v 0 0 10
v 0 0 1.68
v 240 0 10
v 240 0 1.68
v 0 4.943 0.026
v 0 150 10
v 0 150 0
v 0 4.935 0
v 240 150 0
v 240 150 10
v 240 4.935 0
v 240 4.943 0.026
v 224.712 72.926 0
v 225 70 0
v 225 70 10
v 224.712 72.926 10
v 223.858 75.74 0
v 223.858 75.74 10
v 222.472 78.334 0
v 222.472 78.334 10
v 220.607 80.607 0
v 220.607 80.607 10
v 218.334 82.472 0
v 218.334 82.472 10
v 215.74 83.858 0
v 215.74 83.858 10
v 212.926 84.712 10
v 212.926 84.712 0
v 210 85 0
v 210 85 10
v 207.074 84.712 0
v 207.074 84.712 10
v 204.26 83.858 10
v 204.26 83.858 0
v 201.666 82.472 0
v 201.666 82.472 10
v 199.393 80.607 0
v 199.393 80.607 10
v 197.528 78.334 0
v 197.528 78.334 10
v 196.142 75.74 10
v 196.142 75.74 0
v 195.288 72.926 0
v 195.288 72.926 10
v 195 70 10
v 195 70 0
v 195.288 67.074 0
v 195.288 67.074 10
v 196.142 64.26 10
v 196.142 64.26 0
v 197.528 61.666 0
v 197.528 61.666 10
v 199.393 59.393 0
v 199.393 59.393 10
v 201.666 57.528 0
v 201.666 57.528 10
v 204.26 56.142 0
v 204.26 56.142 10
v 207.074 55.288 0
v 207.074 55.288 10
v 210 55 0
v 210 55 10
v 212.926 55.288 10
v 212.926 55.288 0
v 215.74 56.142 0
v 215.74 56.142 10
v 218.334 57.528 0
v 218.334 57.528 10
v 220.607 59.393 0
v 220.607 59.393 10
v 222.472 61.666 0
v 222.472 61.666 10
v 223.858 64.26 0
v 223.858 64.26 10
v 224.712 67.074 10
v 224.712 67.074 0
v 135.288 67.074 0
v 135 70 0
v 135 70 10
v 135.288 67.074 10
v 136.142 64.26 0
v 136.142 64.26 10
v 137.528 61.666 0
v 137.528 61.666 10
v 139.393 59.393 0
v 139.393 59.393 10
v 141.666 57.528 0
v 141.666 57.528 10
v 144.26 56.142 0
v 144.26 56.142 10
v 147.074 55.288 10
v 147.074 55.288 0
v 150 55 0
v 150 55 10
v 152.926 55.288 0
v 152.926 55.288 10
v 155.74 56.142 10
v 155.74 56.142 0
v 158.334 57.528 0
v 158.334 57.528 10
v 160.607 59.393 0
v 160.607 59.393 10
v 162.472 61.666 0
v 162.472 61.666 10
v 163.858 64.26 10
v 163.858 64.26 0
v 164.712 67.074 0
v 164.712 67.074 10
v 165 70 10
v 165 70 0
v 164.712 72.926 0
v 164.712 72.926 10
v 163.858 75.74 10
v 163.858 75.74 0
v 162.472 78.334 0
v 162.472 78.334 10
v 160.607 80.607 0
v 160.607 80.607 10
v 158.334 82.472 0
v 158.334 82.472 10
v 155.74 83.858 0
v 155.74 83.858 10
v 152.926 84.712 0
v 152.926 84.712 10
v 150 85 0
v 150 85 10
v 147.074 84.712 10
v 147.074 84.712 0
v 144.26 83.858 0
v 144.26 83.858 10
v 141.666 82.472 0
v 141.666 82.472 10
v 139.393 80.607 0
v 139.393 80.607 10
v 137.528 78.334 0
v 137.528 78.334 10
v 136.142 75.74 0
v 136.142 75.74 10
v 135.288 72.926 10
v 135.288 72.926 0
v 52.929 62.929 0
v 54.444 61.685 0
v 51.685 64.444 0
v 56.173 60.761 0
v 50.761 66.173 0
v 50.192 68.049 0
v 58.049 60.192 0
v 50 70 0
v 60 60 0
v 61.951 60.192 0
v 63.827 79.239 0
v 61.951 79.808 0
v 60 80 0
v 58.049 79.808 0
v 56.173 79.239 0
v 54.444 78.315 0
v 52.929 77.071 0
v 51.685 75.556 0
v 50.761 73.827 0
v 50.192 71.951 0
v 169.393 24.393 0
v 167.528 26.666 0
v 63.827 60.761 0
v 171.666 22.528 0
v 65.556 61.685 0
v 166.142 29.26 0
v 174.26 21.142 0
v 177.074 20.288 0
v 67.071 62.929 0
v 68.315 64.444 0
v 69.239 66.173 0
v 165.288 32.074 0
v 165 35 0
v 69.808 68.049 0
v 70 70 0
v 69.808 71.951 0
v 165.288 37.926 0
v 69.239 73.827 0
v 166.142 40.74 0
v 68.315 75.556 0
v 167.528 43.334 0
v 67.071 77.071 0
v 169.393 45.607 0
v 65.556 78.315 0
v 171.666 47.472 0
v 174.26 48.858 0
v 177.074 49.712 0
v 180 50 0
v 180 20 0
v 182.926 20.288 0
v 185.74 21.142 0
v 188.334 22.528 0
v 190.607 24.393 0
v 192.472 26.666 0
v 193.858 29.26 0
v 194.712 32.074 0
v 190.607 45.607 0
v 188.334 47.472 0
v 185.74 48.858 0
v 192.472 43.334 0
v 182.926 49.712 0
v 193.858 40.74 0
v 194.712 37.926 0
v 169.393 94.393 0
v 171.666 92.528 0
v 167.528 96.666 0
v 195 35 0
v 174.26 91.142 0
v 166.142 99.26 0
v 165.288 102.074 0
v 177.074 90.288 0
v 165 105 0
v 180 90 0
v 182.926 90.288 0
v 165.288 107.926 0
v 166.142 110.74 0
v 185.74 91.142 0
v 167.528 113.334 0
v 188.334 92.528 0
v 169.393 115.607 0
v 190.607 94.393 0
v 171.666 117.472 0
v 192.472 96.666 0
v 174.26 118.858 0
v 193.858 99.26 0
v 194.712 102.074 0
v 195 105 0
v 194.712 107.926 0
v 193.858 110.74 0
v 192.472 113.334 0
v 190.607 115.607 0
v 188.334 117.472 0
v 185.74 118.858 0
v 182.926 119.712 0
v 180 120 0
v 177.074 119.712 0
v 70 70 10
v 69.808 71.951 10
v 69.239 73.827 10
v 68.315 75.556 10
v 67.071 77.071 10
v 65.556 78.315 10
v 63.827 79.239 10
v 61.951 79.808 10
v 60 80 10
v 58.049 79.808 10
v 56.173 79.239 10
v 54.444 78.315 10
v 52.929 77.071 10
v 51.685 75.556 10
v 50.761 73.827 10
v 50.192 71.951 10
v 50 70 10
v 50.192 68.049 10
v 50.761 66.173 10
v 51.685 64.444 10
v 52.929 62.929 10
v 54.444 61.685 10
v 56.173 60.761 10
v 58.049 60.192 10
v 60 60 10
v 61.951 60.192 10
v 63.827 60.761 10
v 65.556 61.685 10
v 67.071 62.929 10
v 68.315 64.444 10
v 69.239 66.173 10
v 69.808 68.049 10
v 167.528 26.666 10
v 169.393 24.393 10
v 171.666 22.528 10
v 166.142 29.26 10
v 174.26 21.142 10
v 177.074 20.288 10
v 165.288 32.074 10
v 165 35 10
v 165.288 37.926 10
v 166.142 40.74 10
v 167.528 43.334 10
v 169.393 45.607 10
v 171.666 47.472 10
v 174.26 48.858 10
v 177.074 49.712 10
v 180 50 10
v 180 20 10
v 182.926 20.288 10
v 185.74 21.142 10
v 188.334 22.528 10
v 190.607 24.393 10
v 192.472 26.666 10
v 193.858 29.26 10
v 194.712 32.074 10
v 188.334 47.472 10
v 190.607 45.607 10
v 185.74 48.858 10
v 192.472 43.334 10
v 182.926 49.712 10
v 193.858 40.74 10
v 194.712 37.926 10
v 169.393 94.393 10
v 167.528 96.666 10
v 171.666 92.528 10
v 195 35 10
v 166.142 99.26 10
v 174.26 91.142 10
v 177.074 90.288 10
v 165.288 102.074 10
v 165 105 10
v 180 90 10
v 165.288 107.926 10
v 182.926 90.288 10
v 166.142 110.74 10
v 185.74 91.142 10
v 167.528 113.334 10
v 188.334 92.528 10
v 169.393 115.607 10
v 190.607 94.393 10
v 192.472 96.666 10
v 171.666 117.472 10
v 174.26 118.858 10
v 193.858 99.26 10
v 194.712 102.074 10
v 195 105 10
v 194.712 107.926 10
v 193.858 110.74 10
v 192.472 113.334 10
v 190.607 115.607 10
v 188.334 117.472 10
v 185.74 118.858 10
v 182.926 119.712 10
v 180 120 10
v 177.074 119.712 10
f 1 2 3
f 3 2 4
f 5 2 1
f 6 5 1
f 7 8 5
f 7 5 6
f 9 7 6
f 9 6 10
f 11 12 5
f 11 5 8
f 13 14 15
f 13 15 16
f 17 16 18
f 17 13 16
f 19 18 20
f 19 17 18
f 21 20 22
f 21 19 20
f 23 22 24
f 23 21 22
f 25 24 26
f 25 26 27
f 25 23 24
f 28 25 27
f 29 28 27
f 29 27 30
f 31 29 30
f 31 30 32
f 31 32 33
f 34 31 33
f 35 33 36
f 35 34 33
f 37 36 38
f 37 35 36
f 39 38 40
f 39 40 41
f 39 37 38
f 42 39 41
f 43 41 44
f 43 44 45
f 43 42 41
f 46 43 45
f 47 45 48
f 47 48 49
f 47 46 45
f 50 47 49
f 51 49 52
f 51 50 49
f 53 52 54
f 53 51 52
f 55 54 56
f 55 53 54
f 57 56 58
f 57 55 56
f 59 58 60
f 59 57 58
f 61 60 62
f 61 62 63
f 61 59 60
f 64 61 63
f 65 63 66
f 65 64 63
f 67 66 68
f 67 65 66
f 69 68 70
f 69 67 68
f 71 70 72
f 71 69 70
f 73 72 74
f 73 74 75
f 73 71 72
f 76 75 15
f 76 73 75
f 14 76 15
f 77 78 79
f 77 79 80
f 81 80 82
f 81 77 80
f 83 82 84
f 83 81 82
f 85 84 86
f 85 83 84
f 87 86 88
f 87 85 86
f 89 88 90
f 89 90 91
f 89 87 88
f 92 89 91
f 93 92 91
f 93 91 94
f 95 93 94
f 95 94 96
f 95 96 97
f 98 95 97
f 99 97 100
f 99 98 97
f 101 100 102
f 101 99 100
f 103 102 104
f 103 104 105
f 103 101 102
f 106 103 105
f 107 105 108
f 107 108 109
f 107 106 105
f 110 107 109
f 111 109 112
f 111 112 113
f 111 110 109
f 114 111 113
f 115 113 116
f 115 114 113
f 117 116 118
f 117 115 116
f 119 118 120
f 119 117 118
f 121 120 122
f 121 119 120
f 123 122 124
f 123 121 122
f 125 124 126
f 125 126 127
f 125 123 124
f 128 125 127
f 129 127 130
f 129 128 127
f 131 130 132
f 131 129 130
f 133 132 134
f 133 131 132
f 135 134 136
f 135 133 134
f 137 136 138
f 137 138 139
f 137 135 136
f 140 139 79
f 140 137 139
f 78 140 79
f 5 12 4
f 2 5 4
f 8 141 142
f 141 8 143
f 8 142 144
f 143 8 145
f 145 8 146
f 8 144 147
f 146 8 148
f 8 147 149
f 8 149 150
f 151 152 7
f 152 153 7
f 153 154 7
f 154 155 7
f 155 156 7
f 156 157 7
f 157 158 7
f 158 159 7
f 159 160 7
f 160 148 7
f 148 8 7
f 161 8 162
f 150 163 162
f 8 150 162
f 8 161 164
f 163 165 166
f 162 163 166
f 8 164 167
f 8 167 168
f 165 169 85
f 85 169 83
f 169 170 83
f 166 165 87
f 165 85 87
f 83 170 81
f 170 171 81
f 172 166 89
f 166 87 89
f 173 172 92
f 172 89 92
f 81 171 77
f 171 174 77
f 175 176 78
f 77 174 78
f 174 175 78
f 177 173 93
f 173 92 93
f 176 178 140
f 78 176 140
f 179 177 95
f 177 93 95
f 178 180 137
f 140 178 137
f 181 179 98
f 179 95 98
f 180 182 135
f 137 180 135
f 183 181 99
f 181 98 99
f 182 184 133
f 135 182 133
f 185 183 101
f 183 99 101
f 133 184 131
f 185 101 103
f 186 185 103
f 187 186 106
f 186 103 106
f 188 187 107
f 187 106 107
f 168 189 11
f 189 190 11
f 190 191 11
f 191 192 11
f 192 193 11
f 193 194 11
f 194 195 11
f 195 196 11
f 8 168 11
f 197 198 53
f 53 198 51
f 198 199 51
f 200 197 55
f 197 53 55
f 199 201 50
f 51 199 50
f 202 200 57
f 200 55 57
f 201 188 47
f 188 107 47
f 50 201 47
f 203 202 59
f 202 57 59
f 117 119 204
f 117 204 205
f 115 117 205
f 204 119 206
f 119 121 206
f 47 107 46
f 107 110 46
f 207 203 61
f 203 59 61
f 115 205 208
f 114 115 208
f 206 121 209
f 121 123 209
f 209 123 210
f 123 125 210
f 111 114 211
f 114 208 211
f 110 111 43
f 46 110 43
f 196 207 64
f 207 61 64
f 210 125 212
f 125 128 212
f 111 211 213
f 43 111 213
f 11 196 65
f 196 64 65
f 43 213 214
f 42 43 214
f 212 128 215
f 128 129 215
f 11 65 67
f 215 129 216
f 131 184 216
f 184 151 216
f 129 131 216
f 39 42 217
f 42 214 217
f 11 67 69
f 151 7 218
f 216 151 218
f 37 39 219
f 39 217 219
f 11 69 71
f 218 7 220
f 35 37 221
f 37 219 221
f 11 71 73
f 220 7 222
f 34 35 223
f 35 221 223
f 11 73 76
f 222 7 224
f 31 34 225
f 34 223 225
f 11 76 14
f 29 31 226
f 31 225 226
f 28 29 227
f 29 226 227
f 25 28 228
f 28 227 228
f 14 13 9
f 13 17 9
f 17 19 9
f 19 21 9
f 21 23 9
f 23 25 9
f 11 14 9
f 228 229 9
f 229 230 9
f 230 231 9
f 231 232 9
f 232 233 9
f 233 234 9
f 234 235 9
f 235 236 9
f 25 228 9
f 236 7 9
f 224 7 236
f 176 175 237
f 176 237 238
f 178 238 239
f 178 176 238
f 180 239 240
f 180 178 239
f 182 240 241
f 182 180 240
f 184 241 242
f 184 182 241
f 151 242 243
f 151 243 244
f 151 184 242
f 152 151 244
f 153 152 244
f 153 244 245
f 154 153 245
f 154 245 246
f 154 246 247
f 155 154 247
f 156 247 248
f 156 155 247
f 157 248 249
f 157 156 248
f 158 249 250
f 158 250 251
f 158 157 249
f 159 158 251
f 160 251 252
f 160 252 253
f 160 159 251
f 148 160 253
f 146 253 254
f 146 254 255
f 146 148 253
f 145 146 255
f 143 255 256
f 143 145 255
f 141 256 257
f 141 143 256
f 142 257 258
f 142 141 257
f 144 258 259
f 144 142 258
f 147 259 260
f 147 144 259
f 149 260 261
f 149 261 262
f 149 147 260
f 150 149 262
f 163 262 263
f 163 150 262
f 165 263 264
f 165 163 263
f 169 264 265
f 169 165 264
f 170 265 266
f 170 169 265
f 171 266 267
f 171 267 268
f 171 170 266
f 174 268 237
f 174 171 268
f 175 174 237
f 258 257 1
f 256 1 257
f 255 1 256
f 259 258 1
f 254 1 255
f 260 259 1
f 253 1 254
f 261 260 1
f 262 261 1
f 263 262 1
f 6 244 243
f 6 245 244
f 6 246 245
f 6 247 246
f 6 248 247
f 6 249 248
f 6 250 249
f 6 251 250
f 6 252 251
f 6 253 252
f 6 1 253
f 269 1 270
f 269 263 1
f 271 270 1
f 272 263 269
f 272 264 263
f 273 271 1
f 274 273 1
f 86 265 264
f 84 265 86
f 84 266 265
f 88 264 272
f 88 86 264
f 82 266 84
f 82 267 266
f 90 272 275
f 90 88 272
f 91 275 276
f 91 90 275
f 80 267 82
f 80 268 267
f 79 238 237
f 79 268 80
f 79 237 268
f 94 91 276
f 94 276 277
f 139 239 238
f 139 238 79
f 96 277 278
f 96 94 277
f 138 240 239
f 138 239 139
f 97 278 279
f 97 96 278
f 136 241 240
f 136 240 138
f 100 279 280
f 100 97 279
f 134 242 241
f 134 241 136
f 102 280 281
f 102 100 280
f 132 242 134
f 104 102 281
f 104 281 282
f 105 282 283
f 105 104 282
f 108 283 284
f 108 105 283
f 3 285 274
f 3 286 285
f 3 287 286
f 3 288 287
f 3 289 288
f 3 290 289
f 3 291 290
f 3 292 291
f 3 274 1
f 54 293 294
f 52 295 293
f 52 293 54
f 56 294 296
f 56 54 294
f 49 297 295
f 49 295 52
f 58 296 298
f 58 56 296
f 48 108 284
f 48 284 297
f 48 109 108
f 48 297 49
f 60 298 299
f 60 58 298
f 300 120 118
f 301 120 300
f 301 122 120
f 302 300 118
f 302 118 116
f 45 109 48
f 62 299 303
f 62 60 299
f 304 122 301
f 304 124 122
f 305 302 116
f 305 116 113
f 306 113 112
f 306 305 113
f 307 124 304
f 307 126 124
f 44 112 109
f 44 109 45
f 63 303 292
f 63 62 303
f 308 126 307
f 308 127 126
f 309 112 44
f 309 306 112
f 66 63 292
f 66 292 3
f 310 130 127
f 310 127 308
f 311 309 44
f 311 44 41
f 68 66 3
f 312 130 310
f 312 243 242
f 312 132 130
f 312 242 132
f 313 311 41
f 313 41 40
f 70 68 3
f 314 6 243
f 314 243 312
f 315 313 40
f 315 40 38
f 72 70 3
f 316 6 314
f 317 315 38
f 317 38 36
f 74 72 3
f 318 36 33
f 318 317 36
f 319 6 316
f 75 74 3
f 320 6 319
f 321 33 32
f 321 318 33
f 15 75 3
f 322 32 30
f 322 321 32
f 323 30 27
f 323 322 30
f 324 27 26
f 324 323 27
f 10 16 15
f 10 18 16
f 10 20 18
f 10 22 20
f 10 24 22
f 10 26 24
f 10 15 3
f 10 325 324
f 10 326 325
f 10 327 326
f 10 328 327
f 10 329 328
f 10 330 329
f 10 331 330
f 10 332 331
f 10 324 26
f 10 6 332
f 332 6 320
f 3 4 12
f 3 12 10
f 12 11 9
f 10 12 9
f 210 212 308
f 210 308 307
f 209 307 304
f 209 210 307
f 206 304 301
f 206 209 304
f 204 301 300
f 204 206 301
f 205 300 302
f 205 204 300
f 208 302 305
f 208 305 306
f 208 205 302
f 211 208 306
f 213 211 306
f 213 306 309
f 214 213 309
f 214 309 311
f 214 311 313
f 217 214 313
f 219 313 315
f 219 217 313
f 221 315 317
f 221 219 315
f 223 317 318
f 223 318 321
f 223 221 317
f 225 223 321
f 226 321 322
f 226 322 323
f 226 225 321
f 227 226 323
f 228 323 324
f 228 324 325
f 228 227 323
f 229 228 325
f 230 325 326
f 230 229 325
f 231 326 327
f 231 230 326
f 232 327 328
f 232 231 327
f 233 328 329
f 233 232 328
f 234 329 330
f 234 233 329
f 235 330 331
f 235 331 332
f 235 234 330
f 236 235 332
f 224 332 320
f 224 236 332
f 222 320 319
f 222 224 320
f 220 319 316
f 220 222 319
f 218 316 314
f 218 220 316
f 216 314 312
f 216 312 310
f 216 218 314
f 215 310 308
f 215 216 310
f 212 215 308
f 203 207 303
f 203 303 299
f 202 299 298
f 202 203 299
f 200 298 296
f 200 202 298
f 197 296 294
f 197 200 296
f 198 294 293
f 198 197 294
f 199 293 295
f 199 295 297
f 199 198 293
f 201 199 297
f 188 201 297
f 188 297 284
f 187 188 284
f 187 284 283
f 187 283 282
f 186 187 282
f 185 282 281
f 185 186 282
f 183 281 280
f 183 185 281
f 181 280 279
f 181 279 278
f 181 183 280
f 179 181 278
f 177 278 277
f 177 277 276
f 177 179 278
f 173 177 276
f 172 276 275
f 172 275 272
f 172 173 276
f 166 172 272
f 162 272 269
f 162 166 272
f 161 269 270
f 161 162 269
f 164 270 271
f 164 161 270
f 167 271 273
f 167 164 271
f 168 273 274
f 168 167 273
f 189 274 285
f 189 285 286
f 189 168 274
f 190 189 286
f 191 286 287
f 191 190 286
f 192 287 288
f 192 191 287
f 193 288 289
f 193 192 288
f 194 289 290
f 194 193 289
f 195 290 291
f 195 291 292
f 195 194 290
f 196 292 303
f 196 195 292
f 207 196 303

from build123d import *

# Parameters (mm, degrees)
CROQUIS2_W              = 240
CROQUIS2_H              = 150
CROQUIS2_R              = 10
CROQUIS2_R_2            = 15
SALIENTE_EXTRUIR2_DEPTH = 10
CORTAR_EXTRUIR1_DEPTH   = 240
CORTAR_EXTRUIR2_DEPTH   = 240


with BuildPart() as part:
    # Croquis2 → Saliente-Extruir2 (new body)
    with BuildSketch(Plane.XY):
        with Locations((120, 75)):
            Rectangle(CROQUIS2_W, CROQUIS2_H)
        with Locations((60, 70)):
            Circle(CROQUIS2_R, mode=Mode.SUBTRACT)
        with Locations((180, 35)):
            Circle(CROQUIS2_R_2, mode=Mode.SUBTRACT)
        with Locations((210, 70)):
            Circle(CROQUIS2_R_2, mode=Mode.SUBTRACT)
        with Locations(Location((150, 70, 0), (0, 0, 180))):
            Circle(CROQUIS2_R_2, mode=Mode.SUBTRACT)
        with Locations(Location((180, 105, 0), (0, 0, 180))):
            Circle(CROQUIS2_R_2, mode=Mode.SUBTRACT)
    extrude(amount=SALIENTE_EXTRUIR2_DEPTH)

    # Croquis4 → Cortar-Extruir1 (cut)
    with BuildSketch(Plane(origin=(240, 0, 0), x_dir=(0, 0, -1), z_dir=(1, 0, 0))):
        Polygon((-0.025530109, 4.943381022), (-1.679665648, 0), (0, 0), align=None)
    extrude(amount=-CORTAR_EXTRUIR1_DEPTH, mode=Mode.SUBTRACT)

    # Croquis6 → Cortar-Extruir2 (cut)
    with BuildSketch(Plane(origin=(240, 0, 0), x_dir=(0, 0, -1), z_dir=(1, 0, 0))):
        Polygon((-0.025530109, 4.943381022), (0, 4.934838233), (0, -0.070345502), (-0.012765054, -0.070345502), align=None)
    extrude(amount=-CORTAR_EXTRUIR2_DEPTH, mode=Mode.SUBTRACT)


solid = part.part
